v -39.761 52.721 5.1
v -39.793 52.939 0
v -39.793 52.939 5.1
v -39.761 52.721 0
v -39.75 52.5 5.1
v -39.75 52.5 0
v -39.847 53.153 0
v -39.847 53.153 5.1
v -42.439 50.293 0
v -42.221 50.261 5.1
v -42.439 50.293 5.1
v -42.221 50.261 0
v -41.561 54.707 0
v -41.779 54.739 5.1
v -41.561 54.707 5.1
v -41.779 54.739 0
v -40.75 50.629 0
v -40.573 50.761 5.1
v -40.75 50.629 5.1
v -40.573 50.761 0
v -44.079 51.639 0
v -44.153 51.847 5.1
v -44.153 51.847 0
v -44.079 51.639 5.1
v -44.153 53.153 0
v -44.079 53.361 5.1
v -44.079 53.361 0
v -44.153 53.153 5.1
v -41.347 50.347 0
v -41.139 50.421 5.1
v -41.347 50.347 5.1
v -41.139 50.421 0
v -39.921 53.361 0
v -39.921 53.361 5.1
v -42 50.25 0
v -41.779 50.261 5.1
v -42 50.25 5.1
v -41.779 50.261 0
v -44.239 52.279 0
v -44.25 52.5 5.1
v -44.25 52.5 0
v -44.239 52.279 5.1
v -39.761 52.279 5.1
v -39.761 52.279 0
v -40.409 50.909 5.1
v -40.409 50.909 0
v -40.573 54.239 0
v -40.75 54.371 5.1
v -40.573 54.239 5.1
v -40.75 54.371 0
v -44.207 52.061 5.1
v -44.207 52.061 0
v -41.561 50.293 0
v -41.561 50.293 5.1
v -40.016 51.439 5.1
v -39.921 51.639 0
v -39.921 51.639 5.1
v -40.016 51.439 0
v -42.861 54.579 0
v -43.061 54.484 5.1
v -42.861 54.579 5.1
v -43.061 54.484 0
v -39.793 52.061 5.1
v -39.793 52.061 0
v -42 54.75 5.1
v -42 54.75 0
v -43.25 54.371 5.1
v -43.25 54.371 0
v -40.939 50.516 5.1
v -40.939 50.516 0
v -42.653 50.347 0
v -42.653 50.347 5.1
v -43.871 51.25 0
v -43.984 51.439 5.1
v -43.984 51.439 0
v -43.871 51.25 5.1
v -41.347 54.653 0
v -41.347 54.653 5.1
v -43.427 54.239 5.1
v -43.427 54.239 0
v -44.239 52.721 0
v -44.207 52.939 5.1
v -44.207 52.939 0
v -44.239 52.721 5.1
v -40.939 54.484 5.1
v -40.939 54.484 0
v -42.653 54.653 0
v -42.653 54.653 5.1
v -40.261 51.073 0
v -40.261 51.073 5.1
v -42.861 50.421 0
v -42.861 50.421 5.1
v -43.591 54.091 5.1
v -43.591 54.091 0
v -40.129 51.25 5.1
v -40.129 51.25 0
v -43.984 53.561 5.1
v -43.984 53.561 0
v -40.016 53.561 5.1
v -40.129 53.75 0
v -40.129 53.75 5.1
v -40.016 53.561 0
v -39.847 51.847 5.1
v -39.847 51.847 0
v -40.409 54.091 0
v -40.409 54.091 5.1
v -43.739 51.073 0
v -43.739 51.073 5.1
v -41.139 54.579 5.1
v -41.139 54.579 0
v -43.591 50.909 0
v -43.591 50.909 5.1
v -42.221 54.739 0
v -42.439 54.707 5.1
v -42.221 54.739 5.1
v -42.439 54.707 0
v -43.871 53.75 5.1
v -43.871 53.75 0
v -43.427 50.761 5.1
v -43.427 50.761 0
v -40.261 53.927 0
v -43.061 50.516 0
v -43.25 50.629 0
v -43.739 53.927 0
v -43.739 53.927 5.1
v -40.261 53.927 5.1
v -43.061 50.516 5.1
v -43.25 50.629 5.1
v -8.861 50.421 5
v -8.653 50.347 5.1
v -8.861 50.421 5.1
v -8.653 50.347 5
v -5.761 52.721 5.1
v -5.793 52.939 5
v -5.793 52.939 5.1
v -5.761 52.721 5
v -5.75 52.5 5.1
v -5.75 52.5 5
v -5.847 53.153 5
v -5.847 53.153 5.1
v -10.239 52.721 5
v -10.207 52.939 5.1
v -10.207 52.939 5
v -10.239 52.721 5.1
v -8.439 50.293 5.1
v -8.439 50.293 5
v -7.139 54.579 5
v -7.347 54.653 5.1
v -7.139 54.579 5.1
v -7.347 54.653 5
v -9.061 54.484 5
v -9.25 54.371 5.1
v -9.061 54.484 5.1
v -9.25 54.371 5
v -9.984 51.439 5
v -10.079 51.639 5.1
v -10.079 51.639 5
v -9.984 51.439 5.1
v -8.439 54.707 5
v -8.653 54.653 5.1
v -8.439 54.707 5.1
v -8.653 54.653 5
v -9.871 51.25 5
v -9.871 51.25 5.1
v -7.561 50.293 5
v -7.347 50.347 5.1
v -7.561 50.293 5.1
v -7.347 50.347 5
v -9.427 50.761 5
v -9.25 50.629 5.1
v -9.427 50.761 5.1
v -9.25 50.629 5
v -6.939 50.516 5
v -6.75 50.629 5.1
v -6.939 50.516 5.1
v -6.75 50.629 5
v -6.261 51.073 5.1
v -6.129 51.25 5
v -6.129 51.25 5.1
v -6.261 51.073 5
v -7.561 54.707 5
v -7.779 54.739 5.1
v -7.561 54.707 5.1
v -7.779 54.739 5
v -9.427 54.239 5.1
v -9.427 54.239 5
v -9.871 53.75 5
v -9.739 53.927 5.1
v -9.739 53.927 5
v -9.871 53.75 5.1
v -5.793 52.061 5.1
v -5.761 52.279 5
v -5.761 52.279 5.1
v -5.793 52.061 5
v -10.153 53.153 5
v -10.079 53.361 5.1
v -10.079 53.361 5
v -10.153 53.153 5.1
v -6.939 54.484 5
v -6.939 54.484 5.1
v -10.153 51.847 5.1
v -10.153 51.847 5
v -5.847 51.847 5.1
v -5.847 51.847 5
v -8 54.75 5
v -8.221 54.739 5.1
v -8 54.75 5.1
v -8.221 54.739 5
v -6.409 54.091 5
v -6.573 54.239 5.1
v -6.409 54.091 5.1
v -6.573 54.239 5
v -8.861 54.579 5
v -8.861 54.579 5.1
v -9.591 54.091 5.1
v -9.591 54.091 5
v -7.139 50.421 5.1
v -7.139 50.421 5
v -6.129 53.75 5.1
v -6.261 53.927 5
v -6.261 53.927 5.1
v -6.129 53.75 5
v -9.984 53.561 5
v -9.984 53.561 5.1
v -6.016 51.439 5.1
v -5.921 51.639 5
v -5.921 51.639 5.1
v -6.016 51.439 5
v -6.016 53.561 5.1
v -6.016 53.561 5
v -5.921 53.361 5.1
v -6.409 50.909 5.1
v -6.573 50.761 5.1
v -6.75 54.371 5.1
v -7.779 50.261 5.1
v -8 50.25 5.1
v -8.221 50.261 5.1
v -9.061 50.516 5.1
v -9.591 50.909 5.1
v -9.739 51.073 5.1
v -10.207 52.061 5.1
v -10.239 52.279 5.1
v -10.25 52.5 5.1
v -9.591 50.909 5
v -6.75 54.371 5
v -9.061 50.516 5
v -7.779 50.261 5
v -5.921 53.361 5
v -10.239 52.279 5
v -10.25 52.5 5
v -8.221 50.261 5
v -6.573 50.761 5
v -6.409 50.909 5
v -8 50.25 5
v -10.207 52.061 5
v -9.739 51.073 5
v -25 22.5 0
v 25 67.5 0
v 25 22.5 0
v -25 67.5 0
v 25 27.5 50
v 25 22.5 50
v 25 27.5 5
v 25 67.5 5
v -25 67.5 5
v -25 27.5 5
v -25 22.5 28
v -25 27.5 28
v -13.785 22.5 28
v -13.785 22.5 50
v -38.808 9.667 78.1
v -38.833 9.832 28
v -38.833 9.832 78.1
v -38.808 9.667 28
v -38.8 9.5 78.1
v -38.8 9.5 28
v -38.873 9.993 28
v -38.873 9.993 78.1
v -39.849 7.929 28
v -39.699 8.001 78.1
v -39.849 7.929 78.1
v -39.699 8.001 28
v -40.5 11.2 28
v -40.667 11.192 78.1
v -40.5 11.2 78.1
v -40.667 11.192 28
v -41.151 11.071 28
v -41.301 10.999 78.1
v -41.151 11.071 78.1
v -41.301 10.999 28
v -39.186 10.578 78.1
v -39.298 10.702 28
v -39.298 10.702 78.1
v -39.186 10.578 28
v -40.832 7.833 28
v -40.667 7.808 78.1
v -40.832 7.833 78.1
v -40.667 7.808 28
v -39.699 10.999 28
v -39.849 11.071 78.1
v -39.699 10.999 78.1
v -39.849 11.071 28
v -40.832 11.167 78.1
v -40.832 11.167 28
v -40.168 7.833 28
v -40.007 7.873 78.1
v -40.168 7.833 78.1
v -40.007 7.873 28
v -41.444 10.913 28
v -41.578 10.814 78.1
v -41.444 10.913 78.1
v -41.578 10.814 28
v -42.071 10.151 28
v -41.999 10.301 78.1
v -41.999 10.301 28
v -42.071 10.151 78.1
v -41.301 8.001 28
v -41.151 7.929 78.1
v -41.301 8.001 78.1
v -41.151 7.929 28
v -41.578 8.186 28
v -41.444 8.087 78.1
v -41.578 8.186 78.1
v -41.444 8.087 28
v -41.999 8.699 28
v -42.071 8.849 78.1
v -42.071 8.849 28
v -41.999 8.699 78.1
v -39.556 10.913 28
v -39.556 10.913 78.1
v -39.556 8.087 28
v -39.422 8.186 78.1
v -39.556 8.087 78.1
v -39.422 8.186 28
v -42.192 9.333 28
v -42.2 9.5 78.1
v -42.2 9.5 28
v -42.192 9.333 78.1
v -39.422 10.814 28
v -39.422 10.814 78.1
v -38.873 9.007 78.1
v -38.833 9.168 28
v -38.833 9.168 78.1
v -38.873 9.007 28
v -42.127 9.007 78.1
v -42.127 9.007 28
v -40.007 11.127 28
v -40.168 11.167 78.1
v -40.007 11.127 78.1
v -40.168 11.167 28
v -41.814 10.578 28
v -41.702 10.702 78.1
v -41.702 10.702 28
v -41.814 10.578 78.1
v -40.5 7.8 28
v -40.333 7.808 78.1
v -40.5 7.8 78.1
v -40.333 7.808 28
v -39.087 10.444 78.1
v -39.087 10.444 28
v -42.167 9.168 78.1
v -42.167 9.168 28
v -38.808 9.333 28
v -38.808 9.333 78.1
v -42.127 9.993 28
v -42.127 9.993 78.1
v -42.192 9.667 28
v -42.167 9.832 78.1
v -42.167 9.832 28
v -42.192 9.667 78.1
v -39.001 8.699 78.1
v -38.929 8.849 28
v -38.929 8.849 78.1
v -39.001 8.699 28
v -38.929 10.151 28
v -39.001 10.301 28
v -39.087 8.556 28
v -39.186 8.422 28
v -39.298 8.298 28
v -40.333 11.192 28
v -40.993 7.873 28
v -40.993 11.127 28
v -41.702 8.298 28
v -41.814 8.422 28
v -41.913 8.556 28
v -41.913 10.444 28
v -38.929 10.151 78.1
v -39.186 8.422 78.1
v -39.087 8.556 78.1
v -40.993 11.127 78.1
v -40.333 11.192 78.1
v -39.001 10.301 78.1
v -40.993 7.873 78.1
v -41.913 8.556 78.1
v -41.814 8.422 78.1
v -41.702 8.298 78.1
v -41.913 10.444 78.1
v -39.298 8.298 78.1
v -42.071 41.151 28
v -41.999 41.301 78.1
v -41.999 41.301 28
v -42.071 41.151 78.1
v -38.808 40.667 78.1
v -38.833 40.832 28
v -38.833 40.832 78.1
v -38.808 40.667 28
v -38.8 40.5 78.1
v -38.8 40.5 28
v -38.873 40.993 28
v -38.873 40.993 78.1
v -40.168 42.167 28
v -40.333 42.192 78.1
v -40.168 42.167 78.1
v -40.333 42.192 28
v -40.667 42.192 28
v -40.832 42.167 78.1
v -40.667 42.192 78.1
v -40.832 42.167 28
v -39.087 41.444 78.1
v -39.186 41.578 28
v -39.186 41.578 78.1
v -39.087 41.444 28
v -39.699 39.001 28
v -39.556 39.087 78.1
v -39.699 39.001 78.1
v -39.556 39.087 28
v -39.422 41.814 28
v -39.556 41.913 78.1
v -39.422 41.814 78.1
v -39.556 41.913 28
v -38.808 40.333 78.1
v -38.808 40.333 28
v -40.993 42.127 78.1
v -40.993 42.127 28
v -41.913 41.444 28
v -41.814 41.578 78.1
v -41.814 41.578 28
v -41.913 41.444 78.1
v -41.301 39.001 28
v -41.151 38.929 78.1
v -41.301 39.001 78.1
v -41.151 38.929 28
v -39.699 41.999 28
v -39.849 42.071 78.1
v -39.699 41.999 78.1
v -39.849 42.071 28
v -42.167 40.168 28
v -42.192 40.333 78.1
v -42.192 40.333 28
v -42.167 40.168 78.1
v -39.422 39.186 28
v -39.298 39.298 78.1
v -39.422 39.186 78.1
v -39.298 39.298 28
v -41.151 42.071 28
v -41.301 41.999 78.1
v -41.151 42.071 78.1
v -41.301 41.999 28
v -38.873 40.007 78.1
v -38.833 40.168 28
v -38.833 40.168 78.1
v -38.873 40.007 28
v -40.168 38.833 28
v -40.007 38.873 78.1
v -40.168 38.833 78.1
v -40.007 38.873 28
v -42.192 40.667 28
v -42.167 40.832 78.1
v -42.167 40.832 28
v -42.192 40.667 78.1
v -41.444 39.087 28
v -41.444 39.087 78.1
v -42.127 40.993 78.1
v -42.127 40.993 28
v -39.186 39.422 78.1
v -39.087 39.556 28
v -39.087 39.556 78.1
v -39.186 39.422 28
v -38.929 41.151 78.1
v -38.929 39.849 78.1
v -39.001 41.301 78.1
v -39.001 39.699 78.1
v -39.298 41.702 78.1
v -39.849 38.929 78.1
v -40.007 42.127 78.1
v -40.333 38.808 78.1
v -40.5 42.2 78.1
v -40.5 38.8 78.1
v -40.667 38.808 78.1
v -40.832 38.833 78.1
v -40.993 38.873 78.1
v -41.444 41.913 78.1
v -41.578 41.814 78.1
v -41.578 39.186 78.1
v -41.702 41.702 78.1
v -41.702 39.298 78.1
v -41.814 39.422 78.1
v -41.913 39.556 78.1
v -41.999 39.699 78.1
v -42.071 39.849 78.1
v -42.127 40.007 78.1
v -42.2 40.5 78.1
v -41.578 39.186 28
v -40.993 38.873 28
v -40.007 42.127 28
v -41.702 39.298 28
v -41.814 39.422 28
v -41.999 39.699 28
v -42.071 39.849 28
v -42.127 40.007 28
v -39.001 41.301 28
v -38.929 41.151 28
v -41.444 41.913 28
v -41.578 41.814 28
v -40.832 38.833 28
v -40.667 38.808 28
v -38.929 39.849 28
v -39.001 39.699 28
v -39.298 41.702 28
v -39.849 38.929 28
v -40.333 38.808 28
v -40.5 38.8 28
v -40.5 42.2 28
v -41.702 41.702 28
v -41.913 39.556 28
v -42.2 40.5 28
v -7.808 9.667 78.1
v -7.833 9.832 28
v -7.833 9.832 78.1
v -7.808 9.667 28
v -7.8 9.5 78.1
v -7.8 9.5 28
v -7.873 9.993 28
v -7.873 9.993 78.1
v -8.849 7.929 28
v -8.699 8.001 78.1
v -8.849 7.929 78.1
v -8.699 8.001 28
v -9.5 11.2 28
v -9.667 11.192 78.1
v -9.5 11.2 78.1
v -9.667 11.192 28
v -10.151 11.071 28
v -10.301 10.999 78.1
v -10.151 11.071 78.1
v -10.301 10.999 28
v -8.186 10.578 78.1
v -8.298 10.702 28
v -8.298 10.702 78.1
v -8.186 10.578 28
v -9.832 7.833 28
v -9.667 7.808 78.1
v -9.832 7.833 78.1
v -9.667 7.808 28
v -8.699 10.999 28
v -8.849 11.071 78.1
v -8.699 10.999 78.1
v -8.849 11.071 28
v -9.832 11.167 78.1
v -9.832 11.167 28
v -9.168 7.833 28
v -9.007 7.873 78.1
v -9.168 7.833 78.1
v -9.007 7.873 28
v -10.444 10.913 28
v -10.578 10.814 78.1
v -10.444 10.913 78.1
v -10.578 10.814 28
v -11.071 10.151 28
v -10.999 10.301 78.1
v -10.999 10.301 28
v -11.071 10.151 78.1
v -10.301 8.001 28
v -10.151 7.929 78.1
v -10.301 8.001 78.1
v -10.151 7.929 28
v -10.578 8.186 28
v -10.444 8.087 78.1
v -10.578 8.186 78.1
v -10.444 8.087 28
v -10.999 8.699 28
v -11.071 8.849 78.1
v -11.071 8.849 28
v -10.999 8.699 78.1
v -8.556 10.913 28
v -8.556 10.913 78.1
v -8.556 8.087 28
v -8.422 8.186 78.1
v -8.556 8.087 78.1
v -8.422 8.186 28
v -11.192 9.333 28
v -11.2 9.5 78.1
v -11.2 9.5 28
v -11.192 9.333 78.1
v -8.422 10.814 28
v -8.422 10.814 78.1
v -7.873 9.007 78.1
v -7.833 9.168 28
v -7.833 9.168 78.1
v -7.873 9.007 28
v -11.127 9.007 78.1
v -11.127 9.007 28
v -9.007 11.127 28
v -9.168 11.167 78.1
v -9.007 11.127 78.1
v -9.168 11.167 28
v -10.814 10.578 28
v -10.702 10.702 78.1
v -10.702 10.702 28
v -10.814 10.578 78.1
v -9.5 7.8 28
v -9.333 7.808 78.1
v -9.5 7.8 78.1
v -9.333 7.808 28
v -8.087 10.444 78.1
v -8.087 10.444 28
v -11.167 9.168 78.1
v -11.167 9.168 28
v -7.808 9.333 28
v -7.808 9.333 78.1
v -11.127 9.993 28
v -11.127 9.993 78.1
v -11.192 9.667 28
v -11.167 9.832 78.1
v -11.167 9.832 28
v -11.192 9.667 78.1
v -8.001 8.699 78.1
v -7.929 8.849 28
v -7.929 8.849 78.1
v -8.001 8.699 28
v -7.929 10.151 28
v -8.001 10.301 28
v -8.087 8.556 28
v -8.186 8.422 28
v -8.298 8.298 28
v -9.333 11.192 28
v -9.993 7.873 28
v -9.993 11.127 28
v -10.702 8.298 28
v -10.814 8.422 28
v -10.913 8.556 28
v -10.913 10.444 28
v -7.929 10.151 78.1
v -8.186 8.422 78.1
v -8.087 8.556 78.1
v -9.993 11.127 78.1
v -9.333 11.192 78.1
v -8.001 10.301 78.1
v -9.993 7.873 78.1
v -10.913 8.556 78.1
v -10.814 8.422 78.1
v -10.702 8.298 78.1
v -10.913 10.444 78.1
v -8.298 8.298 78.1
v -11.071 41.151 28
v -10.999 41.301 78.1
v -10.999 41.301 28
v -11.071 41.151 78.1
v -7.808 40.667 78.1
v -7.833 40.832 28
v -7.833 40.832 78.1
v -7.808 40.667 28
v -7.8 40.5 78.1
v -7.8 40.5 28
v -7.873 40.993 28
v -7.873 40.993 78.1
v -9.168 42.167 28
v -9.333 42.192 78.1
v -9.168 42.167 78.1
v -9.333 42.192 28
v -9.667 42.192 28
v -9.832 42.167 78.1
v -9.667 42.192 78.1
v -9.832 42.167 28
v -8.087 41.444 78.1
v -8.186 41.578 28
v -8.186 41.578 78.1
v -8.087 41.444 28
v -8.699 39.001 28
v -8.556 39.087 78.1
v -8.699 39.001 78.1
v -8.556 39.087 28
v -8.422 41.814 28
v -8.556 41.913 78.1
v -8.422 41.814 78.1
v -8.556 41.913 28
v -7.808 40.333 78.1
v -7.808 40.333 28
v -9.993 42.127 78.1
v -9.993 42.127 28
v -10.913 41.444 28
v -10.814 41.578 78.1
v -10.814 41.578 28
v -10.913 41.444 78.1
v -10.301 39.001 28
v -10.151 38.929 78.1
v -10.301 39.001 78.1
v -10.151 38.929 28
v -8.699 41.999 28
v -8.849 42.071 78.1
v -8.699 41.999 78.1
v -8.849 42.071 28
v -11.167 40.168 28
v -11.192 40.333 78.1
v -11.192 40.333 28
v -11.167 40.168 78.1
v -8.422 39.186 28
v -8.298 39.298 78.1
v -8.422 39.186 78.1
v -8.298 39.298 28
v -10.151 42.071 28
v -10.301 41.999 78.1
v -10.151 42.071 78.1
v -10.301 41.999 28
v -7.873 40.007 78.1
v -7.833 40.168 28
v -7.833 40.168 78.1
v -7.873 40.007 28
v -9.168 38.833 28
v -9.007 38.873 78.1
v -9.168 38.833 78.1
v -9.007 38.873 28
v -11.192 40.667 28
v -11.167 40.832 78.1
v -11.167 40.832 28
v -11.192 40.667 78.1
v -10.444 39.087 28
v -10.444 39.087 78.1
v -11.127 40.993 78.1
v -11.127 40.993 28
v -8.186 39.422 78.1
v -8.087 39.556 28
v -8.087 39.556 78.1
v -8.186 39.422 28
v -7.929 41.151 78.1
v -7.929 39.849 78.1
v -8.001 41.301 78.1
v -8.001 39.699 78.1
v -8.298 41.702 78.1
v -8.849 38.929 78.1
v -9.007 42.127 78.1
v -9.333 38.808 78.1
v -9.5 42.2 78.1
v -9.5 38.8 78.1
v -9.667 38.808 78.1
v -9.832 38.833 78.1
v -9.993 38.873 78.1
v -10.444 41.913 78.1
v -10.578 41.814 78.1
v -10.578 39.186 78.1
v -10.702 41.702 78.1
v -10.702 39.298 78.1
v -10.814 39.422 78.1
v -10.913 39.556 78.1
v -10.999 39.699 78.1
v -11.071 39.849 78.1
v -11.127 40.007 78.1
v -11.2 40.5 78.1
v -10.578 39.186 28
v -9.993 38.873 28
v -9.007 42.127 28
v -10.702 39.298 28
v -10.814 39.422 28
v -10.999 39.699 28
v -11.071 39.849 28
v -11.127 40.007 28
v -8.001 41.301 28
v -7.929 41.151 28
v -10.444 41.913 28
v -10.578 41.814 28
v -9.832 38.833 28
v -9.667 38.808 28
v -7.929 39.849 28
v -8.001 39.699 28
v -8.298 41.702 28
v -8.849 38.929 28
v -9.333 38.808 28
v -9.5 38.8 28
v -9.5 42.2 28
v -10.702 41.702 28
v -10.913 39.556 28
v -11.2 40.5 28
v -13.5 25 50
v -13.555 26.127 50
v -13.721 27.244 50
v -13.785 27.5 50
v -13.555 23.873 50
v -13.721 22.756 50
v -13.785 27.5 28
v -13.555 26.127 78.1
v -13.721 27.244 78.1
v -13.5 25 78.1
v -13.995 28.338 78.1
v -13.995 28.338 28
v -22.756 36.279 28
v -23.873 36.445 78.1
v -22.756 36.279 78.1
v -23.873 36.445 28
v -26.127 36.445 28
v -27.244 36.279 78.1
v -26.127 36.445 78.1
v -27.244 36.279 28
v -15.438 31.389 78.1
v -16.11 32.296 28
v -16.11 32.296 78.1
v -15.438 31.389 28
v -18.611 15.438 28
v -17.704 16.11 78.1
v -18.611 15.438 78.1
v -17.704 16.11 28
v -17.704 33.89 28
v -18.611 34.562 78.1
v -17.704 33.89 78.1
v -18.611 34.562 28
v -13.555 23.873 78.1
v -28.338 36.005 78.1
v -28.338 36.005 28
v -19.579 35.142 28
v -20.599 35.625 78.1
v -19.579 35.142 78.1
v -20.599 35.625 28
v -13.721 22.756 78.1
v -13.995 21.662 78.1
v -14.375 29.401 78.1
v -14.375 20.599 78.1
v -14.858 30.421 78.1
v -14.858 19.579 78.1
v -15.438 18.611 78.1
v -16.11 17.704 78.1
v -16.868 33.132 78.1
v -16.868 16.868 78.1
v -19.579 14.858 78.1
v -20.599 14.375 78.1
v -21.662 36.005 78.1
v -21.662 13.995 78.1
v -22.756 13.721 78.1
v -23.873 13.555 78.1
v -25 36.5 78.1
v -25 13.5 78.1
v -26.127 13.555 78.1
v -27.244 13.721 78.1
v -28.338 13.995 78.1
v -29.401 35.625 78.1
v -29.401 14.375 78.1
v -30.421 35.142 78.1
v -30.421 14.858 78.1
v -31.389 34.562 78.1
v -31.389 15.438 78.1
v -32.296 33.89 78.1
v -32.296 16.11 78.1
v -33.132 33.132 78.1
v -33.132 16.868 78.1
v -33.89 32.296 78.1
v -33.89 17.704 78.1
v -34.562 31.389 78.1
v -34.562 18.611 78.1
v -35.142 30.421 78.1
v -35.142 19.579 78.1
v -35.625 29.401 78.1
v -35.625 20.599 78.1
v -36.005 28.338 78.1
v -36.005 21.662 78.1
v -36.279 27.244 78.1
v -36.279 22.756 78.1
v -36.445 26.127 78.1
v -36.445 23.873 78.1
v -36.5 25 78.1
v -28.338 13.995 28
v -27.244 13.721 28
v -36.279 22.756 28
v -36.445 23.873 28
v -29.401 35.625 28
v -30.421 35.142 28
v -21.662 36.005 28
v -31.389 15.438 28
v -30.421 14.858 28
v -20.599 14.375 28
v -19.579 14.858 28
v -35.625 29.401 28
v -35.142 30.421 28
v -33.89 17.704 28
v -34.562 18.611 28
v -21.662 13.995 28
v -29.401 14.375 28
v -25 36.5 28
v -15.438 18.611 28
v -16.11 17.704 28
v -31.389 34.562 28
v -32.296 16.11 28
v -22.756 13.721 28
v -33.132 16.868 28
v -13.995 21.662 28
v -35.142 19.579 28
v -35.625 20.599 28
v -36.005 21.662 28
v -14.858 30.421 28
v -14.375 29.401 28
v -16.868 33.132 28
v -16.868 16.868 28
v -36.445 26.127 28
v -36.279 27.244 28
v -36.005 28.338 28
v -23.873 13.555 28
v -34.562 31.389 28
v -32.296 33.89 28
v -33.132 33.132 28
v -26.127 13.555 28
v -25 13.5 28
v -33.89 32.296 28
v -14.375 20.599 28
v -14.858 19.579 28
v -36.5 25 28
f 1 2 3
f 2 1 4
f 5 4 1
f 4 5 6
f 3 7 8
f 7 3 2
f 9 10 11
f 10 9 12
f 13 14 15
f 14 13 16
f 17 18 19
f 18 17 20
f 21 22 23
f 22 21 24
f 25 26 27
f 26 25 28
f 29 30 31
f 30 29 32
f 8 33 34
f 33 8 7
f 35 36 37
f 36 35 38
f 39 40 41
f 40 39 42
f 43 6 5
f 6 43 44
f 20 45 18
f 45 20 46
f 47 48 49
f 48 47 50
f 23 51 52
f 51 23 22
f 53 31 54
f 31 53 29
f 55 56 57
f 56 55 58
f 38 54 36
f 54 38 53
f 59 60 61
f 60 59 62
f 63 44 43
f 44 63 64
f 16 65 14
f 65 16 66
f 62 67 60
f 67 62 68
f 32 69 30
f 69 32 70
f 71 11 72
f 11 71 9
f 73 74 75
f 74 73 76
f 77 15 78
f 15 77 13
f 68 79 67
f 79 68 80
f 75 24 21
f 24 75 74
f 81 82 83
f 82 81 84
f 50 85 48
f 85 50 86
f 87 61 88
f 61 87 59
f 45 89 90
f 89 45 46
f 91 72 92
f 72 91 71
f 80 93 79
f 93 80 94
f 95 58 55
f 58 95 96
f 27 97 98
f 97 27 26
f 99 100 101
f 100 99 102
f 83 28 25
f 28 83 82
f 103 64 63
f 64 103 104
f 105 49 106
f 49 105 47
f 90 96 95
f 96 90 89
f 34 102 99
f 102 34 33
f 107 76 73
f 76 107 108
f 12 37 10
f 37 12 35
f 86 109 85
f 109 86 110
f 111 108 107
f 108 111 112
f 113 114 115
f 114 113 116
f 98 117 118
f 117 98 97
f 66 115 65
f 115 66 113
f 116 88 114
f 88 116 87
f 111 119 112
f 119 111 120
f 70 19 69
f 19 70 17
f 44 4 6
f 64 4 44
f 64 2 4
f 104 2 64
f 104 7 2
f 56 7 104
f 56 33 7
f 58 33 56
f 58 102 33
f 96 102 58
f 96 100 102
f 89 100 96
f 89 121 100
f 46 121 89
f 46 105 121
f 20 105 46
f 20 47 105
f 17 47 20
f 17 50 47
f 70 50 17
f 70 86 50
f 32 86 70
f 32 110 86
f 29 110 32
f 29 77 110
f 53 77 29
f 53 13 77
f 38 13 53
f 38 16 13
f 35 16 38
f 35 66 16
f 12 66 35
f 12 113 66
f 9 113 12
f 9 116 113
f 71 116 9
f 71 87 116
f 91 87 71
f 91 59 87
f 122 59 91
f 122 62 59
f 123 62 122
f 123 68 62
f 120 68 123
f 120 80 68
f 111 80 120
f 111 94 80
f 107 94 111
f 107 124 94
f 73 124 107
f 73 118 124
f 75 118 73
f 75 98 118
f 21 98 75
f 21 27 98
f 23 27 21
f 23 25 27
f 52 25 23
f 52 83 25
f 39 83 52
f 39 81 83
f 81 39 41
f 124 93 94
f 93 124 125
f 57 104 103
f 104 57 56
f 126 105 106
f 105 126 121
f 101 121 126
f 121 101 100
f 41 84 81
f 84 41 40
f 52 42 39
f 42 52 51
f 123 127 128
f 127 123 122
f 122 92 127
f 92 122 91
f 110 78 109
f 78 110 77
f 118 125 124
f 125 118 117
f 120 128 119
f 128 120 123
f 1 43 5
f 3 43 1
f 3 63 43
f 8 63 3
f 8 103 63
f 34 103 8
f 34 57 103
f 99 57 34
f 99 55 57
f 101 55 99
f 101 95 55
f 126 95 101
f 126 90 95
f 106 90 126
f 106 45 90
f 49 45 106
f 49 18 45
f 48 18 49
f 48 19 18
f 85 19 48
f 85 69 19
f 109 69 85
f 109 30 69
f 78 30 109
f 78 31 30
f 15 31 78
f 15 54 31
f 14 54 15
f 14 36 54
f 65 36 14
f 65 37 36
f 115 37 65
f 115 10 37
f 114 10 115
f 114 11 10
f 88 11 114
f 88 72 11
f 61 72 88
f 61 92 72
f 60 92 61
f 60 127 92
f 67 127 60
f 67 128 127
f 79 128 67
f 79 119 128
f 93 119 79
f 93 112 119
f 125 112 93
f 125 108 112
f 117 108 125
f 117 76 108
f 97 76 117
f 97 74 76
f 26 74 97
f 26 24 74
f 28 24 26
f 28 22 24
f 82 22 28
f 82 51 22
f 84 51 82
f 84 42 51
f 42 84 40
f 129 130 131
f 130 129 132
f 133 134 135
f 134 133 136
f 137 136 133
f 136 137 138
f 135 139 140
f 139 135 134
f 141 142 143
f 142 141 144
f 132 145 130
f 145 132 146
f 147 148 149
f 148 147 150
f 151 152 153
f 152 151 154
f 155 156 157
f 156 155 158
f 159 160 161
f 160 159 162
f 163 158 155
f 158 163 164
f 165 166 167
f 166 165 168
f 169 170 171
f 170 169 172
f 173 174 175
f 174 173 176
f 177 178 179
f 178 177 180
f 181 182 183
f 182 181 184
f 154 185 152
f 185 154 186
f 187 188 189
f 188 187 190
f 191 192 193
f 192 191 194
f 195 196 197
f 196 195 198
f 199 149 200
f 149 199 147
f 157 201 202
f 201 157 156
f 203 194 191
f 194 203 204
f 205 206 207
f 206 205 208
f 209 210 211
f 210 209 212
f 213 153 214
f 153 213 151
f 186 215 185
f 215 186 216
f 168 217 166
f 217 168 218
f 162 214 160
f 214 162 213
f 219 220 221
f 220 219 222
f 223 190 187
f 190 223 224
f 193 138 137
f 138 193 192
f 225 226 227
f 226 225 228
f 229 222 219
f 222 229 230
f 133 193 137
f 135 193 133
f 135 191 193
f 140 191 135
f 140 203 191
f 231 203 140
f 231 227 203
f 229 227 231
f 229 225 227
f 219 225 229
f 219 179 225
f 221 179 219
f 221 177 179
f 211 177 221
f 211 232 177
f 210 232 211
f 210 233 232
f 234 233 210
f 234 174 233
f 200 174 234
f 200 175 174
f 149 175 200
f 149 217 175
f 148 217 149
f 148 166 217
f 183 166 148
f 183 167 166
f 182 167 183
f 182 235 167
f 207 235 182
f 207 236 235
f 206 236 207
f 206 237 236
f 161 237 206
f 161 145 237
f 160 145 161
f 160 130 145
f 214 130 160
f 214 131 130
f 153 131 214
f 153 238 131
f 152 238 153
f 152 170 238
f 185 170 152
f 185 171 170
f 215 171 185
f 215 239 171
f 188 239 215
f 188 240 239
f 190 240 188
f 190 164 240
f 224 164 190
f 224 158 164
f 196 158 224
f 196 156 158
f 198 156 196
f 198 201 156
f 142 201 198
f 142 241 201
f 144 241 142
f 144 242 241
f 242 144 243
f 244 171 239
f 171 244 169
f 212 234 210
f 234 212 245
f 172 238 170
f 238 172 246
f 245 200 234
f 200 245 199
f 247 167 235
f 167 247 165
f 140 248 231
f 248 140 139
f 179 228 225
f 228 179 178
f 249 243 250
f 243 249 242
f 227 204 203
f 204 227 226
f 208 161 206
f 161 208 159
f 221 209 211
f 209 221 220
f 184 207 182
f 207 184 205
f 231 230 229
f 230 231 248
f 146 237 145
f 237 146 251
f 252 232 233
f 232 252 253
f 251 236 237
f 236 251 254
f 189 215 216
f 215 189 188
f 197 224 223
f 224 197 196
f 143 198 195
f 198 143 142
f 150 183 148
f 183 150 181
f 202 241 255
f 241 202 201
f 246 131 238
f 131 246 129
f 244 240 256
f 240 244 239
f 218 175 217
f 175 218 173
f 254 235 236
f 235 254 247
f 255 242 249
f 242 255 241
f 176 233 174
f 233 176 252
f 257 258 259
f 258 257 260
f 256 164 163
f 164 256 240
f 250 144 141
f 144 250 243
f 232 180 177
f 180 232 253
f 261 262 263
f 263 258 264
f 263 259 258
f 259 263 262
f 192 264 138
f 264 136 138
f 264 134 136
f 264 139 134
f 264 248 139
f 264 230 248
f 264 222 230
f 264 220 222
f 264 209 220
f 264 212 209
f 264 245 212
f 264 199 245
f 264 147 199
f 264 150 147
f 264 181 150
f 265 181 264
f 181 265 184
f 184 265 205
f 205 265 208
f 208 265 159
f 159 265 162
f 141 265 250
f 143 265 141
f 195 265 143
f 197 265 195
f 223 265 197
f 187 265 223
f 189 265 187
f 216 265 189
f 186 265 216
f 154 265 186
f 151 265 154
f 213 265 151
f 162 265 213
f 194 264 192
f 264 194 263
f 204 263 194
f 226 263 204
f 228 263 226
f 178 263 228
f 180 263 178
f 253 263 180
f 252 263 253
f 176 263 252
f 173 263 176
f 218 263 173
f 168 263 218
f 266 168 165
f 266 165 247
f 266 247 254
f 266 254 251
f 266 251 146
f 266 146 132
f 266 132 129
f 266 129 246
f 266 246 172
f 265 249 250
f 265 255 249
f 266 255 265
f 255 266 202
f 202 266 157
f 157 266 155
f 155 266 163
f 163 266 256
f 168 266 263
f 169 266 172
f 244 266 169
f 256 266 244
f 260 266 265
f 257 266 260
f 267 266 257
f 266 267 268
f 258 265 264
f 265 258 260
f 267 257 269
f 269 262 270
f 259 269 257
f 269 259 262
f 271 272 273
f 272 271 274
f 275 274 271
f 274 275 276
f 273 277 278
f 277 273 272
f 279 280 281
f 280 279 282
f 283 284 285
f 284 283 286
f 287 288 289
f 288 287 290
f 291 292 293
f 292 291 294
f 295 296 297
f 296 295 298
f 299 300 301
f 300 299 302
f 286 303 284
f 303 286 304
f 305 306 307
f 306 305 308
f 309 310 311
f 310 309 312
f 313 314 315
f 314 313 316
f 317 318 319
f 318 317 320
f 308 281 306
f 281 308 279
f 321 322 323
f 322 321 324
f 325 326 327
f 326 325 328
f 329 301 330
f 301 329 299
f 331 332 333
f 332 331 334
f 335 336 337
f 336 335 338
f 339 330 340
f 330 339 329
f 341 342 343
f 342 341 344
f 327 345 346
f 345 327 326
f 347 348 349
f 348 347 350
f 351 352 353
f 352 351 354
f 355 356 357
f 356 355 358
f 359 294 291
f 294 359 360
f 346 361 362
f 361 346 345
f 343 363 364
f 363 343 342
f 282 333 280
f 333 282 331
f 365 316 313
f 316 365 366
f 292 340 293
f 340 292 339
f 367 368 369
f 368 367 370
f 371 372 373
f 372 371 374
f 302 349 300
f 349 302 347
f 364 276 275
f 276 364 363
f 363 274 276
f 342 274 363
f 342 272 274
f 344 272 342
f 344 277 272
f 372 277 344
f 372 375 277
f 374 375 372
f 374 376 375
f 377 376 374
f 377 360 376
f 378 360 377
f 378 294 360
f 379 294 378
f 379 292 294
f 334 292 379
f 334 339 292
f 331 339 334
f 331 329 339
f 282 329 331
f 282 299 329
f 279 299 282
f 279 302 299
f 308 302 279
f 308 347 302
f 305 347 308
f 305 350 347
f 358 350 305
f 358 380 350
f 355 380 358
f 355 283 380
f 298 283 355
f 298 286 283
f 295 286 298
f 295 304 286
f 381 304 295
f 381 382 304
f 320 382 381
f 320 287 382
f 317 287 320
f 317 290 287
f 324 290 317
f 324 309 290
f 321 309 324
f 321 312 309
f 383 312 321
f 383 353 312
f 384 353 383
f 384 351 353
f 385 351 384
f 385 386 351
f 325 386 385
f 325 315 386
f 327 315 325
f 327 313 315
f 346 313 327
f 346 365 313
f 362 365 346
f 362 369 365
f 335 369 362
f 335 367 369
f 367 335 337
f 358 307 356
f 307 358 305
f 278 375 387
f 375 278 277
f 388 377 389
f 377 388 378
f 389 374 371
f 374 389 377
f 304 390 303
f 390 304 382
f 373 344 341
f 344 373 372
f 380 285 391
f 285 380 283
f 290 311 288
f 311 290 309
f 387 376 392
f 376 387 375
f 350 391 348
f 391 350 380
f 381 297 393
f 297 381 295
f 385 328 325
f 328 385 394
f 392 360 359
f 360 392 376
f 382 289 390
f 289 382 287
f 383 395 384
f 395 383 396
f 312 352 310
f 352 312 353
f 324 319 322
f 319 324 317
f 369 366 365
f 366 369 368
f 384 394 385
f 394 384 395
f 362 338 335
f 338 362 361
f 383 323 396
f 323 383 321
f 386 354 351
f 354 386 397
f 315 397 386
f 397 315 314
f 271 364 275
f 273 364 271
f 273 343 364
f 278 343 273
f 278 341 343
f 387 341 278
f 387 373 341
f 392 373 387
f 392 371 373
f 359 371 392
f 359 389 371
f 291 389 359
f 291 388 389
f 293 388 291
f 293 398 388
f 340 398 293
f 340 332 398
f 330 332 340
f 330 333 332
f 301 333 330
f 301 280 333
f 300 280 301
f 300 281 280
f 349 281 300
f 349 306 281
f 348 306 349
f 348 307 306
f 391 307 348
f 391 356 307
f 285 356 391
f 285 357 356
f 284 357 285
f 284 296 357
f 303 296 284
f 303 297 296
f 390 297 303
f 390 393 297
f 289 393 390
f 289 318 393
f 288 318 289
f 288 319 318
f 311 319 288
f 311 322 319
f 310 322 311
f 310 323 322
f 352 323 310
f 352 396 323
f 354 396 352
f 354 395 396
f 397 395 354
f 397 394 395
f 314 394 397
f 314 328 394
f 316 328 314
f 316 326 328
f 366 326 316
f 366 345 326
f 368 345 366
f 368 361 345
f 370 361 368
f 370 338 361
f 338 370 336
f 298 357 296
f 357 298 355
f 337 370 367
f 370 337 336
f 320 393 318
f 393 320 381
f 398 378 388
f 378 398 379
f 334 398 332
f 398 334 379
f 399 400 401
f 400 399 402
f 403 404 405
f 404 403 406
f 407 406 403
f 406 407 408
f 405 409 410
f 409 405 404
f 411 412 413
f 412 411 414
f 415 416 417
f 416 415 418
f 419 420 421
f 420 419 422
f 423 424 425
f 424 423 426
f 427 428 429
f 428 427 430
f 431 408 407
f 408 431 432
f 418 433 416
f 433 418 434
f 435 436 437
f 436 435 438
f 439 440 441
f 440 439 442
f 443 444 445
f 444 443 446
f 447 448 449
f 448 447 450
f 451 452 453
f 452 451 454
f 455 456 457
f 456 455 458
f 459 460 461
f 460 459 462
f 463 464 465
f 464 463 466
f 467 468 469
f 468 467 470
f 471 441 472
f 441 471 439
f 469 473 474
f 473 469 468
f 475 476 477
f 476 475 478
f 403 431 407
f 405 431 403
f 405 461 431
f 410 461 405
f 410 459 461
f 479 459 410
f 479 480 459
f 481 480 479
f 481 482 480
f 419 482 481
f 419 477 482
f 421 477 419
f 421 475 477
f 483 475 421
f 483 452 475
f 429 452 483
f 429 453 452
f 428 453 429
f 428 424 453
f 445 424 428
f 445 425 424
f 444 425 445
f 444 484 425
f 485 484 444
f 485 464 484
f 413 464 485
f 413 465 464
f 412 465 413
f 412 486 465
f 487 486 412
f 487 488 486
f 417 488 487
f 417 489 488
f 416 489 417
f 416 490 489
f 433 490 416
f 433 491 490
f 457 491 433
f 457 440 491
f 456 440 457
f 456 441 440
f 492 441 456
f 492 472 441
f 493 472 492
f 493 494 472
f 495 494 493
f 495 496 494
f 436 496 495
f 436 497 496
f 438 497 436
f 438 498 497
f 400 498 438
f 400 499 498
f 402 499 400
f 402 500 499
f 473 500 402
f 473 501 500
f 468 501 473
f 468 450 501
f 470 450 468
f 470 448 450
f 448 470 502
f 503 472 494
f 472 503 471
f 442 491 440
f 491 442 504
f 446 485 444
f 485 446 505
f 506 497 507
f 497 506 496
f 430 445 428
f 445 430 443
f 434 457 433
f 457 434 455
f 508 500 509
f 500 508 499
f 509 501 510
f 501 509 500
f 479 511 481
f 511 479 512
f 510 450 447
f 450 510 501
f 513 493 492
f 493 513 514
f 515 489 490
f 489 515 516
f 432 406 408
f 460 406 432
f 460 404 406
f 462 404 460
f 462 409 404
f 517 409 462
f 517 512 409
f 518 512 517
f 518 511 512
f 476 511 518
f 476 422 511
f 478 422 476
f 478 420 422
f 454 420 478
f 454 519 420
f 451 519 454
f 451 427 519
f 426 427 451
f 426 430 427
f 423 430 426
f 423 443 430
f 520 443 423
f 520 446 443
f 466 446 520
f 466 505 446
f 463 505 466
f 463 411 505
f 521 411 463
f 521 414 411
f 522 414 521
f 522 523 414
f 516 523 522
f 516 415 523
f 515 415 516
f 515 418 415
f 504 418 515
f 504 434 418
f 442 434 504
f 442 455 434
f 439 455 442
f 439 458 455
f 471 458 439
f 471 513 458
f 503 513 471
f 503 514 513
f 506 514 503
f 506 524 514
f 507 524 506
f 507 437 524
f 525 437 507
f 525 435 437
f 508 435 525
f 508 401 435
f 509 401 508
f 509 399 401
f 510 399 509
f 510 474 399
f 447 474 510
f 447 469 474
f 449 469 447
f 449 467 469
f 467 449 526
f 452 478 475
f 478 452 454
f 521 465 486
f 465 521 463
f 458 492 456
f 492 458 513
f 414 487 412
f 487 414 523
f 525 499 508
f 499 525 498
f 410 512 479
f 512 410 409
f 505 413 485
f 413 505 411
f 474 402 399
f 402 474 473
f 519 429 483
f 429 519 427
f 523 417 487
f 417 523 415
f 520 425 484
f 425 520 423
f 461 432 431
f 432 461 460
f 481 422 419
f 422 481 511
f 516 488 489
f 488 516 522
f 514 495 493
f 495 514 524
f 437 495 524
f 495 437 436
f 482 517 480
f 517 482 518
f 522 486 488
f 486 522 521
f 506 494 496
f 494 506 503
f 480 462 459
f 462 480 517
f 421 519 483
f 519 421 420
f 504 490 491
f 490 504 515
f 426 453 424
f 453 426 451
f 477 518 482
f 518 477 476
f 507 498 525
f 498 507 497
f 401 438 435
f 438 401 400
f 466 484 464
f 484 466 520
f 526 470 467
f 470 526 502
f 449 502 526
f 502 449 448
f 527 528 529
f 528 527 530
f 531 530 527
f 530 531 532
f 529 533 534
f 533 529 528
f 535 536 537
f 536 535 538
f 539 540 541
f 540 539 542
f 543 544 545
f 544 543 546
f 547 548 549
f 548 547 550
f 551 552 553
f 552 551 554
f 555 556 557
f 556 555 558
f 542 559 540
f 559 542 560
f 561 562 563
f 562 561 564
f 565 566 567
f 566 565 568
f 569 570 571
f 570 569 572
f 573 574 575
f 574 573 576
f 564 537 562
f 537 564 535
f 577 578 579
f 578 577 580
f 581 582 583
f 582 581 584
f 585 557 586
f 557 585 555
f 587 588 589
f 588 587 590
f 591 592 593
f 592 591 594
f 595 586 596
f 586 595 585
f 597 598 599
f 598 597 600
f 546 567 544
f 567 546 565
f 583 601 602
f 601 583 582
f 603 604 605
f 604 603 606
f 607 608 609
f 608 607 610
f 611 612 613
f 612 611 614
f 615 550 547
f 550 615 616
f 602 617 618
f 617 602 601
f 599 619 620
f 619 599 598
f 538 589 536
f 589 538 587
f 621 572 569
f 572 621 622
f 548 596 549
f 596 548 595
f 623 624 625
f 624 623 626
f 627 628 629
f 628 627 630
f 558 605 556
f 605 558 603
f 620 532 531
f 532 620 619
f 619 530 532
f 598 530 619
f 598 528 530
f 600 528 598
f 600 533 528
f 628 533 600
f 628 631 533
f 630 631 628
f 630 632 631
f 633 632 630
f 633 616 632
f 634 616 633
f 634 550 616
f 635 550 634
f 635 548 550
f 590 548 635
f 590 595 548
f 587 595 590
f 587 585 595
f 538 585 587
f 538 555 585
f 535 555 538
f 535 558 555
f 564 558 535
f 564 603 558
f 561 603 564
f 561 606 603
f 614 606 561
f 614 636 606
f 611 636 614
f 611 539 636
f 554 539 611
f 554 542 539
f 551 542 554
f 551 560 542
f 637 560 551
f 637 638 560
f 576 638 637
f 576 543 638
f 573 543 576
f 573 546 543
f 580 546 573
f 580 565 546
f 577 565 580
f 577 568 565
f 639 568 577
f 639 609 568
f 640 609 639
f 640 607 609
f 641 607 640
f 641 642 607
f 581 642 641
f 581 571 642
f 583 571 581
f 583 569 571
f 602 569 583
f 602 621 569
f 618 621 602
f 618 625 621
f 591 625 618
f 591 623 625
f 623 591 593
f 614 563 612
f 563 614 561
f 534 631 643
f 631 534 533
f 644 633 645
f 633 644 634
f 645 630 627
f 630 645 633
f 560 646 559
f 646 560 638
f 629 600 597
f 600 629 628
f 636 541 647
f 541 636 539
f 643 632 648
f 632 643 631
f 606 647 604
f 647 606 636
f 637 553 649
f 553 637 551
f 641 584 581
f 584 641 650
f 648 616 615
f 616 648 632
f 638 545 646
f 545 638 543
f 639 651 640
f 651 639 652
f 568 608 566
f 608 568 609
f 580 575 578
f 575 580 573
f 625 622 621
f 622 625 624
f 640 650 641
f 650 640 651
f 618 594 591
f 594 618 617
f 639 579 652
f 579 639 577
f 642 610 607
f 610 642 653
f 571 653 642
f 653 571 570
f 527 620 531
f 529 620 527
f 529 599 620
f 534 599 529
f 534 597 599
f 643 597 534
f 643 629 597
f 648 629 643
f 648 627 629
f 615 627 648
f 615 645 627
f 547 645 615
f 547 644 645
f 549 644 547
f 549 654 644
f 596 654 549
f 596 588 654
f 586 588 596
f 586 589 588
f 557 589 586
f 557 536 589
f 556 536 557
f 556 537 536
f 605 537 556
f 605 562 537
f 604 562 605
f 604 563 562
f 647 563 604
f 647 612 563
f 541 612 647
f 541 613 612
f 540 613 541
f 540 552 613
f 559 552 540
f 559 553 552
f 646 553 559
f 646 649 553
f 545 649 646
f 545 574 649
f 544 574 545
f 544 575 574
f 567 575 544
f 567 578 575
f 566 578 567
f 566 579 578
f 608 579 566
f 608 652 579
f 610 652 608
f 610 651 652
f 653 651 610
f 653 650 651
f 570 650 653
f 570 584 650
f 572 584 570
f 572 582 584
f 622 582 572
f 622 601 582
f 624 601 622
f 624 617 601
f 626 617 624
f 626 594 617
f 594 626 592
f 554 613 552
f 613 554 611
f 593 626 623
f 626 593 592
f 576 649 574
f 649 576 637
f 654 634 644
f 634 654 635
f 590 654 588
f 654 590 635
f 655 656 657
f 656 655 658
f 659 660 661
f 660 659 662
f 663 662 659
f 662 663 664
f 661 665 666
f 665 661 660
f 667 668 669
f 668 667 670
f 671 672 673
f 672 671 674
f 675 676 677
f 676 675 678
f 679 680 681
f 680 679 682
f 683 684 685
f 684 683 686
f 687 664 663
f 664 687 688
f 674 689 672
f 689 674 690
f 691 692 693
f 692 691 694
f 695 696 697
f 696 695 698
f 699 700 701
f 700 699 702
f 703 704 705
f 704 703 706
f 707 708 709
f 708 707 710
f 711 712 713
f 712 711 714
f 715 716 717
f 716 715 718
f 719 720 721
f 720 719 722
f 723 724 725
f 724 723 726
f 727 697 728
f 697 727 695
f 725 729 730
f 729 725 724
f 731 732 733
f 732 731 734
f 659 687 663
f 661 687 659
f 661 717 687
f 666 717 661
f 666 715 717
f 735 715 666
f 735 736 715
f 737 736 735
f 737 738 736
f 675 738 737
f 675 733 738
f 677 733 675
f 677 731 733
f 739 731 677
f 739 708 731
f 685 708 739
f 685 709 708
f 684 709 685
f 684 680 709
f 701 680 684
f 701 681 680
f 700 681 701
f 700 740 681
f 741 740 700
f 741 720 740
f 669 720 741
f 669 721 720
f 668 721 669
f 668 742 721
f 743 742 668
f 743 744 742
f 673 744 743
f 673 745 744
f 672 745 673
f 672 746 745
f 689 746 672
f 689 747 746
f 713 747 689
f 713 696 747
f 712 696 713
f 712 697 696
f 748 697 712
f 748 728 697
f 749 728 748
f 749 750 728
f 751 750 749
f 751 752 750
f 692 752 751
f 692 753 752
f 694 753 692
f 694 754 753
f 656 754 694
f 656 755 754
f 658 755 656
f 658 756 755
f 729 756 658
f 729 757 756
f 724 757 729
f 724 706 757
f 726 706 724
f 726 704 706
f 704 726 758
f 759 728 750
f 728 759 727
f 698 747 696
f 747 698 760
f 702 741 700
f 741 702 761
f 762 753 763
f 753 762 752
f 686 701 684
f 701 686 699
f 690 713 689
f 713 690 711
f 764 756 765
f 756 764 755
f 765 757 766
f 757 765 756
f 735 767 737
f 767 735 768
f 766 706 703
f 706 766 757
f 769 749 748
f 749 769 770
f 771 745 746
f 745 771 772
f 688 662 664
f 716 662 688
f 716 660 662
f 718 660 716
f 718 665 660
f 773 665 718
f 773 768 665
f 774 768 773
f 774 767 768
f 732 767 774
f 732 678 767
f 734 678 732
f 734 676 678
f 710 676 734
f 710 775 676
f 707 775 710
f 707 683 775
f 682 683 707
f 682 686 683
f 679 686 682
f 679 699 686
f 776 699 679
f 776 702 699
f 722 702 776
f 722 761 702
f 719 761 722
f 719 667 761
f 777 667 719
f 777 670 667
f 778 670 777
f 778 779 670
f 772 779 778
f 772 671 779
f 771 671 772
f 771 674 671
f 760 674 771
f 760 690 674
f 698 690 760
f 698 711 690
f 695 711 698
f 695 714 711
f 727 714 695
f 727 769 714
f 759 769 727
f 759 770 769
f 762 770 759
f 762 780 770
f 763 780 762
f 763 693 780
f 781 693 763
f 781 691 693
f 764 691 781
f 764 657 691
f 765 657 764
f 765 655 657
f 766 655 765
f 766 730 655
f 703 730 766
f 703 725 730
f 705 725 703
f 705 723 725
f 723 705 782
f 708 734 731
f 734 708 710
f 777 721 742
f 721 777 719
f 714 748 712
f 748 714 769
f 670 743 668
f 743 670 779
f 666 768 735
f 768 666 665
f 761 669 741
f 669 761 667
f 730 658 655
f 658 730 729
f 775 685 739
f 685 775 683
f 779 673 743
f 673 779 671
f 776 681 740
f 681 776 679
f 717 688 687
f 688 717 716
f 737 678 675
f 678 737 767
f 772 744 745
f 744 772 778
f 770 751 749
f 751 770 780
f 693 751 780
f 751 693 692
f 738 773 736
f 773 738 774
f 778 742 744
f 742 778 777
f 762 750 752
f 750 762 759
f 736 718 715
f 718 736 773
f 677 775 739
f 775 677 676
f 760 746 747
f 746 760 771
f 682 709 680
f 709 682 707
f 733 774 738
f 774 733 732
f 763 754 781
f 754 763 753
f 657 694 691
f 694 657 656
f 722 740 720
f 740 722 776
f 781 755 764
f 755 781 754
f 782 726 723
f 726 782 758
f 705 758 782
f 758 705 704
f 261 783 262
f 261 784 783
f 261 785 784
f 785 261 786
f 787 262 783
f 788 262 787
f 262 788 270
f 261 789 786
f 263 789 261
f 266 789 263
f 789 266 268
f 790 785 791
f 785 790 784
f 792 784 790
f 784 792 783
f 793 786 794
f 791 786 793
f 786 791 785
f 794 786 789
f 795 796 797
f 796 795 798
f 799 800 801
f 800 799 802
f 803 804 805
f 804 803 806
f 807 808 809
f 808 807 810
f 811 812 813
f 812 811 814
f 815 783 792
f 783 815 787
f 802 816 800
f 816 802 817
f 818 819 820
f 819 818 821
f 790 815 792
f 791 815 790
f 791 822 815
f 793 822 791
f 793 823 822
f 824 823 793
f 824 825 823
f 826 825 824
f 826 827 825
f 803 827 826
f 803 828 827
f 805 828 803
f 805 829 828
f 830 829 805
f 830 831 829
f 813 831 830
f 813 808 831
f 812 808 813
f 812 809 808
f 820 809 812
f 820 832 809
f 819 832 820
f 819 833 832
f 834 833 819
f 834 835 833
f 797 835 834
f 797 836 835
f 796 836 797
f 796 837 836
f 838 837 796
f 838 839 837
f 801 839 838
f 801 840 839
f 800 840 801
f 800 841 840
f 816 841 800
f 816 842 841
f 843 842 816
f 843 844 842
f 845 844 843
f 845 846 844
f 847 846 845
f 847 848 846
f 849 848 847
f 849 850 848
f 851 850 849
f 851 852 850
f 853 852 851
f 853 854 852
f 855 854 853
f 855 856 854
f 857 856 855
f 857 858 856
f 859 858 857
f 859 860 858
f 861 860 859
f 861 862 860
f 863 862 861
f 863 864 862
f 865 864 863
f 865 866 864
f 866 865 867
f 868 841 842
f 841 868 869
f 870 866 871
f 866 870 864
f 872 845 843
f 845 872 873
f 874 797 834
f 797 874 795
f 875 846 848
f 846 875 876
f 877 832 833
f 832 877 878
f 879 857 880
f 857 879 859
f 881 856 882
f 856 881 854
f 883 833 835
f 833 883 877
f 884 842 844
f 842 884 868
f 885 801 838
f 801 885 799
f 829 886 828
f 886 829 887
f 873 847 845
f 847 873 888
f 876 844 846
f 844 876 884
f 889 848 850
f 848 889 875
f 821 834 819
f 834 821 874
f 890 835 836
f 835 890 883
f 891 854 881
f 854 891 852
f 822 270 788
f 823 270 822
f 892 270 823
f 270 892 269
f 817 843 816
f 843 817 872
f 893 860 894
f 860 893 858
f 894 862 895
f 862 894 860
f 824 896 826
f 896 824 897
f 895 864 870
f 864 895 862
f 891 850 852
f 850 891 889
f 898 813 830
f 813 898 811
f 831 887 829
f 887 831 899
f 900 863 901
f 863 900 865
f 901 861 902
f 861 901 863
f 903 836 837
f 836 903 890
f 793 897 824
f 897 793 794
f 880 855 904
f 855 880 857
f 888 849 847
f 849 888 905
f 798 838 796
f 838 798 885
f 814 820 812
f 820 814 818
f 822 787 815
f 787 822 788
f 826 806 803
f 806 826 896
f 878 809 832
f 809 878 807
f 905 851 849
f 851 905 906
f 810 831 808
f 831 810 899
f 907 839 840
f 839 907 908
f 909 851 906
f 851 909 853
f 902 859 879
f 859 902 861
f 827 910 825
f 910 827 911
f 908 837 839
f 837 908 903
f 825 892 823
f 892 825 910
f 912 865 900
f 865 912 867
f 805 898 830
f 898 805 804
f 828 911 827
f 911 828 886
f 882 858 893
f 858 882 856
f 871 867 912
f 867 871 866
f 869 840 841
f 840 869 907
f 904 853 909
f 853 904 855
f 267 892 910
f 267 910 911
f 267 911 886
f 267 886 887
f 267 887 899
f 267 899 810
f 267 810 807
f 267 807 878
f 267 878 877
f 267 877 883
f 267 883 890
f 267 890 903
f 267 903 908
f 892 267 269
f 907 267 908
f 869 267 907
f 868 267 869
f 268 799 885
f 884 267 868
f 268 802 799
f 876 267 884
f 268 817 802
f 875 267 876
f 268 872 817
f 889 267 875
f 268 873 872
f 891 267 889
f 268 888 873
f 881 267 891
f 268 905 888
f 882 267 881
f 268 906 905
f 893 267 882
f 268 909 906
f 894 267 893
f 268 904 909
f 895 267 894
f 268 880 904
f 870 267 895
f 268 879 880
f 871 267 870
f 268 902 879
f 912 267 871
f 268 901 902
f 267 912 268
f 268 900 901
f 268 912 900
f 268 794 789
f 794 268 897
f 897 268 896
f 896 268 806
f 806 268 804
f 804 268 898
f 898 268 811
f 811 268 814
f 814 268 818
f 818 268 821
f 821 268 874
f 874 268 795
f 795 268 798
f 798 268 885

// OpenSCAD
// NEMA 17 Stepper Motor L-Bracket
// Print orientation: Base plate on XY plane (Z=0), building upward.
// Centred on origin in X and Y.

// Base Plate Dimensions
$base_x = 50; // x from -25 to 25
$base_y = 45; // y from 0 to 45
$base_z = 5;  // z from 0 to 5

// Base Mounting Holes (M4)
$base_hole_d = 4.5;
$base_hole_x1 = -17;
$base_hole_y1 = 30;
$base_hole_x2 = 17;
$base_hole_y2 = 30;

// Vertical Motor Plate Dimensions
$motor_plate_x = 50; // x from -25 to 25
$motor_plate_y = 5;  // y from 0 to 5
$motor_plate_z = 50; // z from 0 to 50

// Motor Boss Hole
$boss_hole_d = 23;
$boss_hole_x = 0;
$boss_hole_z = 28;

// Motor Screw Holes (M3)
$screw_hole_d = 3.4;
$screw_pattern_size = 31; // 31 mm square pattern
$screw_hole_count = 4;

// Gusset Dimensions
$gusset_thickness = 5; // x thickness
$gusset_leg_y = 20;    // leg along +Y
$gusset_leg_z = 20;    // leg along +Z
$gusset_x_start_left = -25;
$gusset_x_end_left = -20;
$gusset_x_start_right = 20;
$gusset_x_end_right = 25;
$gusset_corner_y = 5;
$gusset_corner_z = 5;

// Global settings
$fn = 64;

module base_plate() {
    // Main block
    translate([0, 0, 0])
        cube([$base_x, $base_y, $base_z]);

    // Cut M4 holes
    $fn = 64;
    for (i = [0, 1]) {
        translate([
            i == 0 ? $base_hole_x1 : $base_hole_x2,
            i == 0 ? $base_hole_y1 : $base_hole_y2,
            0
        ])
            cylinder(
                h = $base_z + 0.1, // Extend slightly past top face
                d = $base_hole_d,
                $fn = 64
            );
    }
}

module motor_plate() {
    // Main block
    translate([0, 0, 0])
        cube([$motor_plate_x, $motor_plate_y, $motor_plate_z]);

    // Cut Boss Hole
    // Centre in Y is at $motor_plate_y / 2 = 2.5
    translate([
        $boss_hole_x,
        $motor_plate_y / 2, 
        $boss_hole_z
    ])
        cylinder(
            h = $motor_plate_z + 0.1, // Extend slightly past top/bottom
            d = $boss_hole_d,
            $fn = 64
        );

    // Cut Screw Holes (31mm square pattern centred on boss)
    // Pattern size 31mm means distance between opposite holes is 31mm.
    // Offset from center = 31 / 2 = 15.5mm.
    $offset = $screw_pattern_size / 2;
    $y_pos = $motor_plate_y / 2; // Centre Y of plate

    for (i = [0, 1]) {
        for (j = [0, 1]) {
            translate([
                $boss_hole_x + (i == 0 ? -$offset : $offset),
                $y_pos + (j == 0 ? -$offset : $offset),
                $boss_hole_z
            ])
                cylinder(
                    h = $motor_plate_z + 0.1, // Extend slightly past top/bottom
                    d = $screw_hole_d,
                    $fn = 64
                );
        }
    }
}

module gusset() {
    // Right triangle in YZ plane, extruded along X
    // Legs: 20mm along +Y, 20mm along +Z
    // Right angle corner at (y=5, z=5) relative to global origin
    // The triangle vertices in YZ plane (relative to corner):
    // Corner (0,0) -> (20,0) -> (20,20) -> (0,20) -> (0,0) creates a square.
    // We need a triangle. Vertices: (0,0), (20,0), (0,20).
    // This forms a right triangle with the right angle at (0,0).
    // The user specified the right-angle corner is at y=5, z=5.
    // So the triangle occupies Y: 5 to 25, Z: 5 to 25.
    
    translate([0, $gusset_corner_y, $gusset_corner_z]) {
        // Define the triangle path relative to the corner (0,0)
        // Points: (0,0) -> (20,0) -> (0,20) -> (0,0)
        polygon(
            points = [
                [0, 0],
                [$gusset_leg_y, 0],
                [0, $gusset_leg_z]
            ]
        );
    }
}

module main() {
    union() {
        // Center the entire assembly on the origin.
        // Base plate X: -25 to 25 (width 50). Center X = 0.
        // Base plate Y: 0 to 45 (width 45). Center Y = 22.5.
        translate([-25, 22.5, 0]) {
            base_plate();
            motor_plate();
            
            // Left Gusset (x from -25 to -20)
            // Center of this 5mm thick gusset is at x = -22.5
            translate([-22.5, 0, 0])
                gusset();
                
            // Right Gusset (x from 20 to 25)
            // Center of this 5mm thick gusset is at x = 22.5
            translate([22.5, 0, 0])
                gusset();
        }
    }
}

main();
